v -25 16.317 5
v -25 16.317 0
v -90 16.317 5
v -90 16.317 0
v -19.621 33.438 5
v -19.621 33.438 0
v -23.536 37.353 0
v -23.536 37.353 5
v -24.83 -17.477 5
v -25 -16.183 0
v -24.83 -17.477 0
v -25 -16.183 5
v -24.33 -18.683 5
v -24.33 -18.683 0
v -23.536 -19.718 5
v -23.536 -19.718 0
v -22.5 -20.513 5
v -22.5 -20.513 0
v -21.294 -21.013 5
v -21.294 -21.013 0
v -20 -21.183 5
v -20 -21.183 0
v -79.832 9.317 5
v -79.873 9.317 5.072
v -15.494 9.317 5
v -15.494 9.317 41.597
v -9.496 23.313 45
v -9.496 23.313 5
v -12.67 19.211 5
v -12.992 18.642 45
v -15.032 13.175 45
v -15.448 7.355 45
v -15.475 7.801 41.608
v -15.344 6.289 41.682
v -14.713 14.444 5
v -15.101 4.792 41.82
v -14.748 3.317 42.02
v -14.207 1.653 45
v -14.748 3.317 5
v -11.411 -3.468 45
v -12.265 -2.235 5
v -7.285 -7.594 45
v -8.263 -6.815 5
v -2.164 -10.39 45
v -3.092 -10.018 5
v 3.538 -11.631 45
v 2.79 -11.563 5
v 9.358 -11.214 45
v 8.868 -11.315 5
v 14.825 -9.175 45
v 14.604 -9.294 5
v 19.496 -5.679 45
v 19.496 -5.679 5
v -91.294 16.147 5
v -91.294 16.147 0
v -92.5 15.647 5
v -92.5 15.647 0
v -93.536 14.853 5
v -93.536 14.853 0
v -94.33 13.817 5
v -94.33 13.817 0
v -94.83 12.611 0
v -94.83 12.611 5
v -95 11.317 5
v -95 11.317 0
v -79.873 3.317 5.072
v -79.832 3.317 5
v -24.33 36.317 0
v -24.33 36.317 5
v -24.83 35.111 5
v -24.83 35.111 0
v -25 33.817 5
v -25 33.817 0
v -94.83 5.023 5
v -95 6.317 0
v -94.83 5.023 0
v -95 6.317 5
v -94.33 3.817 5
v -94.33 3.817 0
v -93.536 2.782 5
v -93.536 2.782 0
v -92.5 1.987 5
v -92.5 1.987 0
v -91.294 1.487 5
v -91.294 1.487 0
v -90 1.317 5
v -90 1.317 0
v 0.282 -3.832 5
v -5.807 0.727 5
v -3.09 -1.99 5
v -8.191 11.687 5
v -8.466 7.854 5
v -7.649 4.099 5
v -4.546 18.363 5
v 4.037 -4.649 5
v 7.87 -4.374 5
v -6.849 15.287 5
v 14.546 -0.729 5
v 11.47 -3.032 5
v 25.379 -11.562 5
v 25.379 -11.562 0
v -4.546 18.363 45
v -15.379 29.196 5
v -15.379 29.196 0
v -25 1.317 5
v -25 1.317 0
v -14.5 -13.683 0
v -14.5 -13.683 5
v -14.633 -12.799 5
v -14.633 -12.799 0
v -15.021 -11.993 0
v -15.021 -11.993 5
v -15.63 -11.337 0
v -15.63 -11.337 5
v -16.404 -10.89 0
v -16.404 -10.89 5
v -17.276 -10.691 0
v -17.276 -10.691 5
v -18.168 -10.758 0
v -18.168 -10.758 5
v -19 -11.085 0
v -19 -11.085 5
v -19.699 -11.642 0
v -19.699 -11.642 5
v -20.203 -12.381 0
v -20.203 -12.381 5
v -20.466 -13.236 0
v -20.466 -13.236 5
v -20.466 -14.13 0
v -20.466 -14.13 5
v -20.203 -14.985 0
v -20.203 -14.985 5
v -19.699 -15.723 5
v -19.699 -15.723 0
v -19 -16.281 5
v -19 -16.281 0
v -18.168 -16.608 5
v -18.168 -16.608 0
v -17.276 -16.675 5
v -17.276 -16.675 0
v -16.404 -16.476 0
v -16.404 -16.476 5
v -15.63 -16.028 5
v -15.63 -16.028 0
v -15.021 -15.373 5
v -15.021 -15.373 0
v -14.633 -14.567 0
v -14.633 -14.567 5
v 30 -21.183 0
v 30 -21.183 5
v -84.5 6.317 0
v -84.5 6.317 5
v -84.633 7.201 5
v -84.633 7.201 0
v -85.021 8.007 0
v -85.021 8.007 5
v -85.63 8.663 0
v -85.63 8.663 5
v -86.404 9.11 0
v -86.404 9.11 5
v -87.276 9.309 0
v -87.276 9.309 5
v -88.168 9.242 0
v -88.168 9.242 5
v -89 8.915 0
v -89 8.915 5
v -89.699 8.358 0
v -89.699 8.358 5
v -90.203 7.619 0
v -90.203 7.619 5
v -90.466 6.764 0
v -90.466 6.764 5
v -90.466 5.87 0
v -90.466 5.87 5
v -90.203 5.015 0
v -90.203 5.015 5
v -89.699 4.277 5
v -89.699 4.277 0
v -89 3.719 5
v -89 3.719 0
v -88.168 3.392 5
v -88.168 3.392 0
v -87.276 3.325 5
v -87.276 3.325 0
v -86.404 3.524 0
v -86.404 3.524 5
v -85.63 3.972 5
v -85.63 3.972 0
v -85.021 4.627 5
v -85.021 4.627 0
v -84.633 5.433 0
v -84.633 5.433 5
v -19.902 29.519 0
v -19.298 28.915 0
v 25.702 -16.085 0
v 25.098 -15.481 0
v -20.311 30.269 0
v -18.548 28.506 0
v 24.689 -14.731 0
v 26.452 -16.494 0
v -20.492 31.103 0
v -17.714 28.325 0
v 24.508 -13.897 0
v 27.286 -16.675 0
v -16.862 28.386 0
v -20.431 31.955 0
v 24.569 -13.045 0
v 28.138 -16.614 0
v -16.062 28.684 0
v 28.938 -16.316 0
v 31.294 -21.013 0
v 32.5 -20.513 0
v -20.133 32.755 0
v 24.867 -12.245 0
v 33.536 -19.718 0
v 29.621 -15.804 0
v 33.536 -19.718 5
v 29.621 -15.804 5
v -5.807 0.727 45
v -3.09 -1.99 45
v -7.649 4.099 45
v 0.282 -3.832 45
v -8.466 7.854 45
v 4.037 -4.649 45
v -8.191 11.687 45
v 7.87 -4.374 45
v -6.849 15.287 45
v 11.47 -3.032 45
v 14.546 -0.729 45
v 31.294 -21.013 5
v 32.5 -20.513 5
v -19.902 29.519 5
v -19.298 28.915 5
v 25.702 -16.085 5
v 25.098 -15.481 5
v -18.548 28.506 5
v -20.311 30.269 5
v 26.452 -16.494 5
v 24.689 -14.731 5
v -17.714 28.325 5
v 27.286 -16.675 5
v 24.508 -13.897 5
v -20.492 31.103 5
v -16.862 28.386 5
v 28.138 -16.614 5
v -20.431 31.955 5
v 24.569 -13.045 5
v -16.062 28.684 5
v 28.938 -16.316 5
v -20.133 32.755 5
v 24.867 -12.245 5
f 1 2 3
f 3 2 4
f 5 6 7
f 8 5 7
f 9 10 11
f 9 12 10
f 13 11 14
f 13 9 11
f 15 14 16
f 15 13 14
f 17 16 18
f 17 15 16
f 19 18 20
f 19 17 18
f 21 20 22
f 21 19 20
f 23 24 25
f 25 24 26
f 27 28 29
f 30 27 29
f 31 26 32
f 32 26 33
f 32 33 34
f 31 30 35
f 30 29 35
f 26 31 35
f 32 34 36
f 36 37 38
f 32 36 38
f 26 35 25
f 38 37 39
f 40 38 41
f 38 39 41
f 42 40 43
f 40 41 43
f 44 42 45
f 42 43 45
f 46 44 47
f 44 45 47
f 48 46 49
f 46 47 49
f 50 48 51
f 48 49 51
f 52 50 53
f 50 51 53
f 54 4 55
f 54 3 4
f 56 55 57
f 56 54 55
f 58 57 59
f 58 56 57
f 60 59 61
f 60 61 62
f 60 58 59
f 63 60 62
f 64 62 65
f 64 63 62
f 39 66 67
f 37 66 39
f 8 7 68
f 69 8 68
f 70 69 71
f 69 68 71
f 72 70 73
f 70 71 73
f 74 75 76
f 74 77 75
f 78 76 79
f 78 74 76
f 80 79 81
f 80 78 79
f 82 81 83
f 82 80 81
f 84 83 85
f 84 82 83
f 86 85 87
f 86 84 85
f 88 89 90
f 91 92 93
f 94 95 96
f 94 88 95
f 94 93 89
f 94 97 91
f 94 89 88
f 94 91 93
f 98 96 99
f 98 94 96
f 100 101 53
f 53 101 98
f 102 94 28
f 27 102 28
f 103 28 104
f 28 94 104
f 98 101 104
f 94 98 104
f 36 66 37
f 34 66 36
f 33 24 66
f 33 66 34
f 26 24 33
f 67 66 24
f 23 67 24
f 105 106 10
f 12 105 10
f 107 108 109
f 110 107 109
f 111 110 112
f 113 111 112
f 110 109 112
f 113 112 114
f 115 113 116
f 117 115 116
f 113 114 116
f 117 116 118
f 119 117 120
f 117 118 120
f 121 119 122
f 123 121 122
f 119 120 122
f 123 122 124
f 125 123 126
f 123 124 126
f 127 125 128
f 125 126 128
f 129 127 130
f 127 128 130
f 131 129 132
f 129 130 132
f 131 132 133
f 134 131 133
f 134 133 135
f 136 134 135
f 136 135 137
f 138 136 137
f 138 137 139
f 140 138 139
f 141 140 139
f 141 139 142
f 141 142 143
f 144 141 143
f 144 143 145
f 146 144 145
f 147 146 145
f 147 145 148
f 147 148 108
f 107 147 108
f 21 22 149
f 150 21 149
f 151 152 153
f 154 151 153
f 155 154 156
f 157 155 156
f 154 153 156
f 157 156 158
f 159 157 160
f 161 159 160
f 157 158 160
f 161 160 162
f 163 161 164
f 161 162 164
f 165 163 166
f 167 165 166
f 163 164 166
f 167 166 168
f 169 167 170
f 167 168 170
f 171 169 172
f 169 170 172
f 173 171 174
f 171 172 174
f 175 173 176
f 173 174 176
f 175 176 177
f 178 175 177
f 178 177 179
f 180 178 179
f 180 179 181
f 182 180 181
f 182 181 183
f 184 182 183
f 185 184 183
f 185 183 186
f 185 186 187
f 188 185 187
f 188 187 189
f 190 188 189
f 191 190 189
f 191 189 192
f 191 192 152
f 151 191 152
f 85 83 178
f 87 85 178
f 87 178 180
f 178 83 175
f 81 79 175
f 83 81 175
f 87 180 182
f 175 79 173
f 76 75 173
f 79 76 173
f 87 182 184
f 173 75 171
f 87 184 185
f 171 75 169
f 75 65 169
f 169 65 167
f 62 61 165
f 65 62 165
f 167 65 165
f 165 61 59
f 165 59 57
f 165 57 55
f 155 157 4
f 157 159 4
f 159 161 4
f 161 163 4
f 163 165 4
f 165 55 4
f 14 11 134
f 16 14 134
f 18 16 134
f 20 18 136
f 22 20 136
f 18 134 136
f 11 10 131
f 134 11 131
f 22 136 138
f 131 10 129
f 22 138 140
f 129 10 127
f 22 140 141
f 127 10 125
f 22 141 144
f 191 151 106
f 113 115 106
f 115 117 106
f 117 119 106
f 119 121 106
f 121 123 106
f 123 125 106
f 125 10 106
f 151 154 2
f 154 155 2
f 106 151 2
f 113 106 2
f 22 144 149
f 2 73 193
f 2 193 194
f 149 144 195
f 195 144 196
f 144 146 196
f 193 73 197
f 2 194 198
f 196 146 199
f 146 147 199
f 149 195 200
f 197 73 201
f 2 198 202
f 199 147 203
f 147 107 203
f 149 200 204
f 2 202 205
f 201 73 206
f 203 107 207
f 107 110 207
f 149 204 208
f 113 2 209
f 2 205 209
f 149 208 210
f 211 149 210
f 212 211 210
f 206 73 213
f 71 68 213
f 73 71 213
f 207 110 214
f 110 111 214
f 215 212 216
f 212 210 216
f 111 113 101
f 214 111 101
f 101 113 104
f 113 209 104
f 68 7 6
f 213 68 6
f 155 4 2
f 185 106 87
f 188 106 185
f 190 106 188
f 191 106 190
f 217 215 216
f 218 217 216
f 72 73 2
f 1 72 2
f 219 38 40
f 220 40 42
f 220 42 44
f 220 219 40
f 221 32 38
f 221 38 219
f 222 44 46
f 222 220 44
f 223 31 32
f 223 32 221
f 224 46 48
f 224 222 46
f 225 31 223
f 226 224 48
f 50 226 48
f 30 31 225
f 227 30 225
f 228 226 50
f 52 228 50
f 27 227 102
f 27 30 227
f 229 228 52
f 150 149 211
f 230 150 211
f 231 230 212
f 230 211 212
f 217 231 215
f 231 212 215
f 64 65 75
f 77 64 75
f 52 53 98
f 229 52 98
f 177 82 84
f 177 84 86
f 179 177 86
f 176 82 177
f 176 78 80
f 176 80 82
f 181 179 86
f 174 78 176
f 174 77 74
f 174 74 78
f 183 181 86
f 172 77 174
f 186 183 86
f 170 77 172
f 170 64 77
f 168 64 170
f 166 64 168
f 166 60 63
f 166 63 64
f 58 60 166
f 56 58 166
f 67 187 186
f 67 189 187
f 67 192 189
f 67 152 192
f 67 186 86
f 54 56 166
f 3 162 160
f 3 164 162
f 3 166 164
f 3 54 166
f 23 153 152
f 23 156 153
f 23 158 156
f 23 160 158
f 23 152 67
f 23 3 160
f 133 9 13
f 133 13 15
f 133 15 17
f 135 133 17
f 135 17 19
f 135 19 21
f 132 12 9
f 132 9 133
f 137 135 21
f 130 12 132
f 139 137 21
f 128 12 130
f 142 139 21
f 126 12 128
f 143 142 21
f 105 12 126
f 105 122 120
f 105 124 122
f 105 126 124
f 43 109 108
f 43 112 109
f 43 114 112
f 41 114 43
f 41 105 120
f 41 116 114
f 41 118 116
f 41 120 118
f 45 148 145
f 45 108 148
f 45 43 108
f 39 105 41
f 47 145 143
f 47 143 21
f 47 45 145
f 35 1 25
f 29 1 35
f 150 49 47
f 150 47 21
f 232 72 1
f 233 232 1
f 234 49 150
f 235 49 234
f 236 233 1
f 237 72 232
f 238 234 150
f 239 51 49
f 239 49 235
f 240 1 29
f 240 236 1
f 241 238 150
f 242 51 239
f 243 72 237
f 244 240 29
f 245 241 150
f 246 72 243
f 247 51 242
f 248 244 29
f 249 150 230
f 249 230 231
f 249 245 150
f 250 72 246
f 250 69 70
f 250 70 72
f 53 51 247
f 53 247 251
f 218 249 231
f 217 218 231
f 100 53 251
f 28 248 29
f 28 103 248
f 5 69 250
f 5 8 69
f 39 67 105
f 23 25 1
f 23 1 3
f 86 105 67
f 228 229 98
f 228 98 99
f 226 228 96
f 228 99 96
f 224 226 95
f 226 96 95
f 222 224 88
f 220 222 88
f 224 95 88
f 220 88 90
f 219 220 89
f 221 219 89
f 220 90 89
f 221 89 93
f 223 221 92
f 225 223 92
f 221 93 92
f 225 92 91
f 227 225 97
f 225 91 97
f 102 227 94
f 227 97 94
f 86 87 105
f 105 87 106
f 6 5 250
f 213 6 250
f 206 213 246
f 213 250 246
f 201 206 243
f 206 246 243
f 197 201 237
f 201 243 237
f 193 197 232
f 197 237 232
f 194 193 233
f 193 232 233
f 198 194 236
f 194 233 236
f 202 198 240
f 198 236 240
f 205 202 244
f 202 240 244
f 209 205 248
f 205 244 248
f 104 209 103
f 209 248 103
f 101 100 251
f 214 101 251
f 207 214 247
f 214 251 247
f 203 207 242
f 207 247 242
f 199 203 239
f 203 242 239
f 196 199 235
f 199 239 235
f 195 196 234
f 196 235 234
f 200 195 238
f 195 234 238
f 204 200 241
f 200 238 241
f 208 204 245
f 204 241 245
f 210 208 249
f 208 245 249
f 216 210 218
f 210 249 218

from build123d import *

# Parameters (mm, degrees)
SALIENTE_EXTRUIR1_DEPTH = 5
SALIENTE_EXTRUIR2_DEPTH = 40
EXTRUIR_L_MINA2_REACH   = 62.374
CROQUIS5_W              = 75.430750805
CROQUIS5_H              = 6
REDONDEO1_R             = 5
CROQUIS6_R              = 3
CORTAR_EXTRUIR1_DEPTH   = 40


with BuildPart() as part:
    # Croquis1 → Saliente-Extruir1 (new body)
    with BuildSketch(Plane.XY):
        with BuildLine():
            Line((-25, 16.317101546), (-95, 16.317101546))
            Line((-95, 16.317101546), (-95, 1.317101546))
            Line((-95, 1.317101546), (-25, 1.317101546))
            Line((-25, 1.317101546), (-25, -21.182898454))
            Line((-25, -21.182898454), (30, -21.182898454))
            ThreePointArc((30, -21.182898454), (31.913417162, -20.802296117), (33.535533906, -19.71843236))
            Line((33.535533906, -19.71843236), (-23.535533906, 37.352635452))
            ThreePointArc((-23.535533906, 37.352635452), (-24.619397663, 35.730518707), (-25, 33.817101546))
            Line((-25, 33.817101546), (-25, 16.317101546))
        make_face()
    extrude(amount=SALIENTE_EXTRUIR1_DEPTH)

    # Croquis2 → Saliente-Extruir2 (add)
    with BuildSketch(Plane.XY.offset(5)):
        with BuildLine():
            Line((-4.545941546, 18.363043092), (-9.495689014, 23.31279056))
            ThreePointArc((-9.495689014, 23.31279056), (-9.495689014, -5.678587469), (19.495689014, -5.678587469))
            Line((19.495689014, -5.678587469), (14.545941546, -0.72884))
            ThreePointArc((14.545941546, -0.72884), (-4.545941546, -0.72884), (-4.545941546, 18.363043092))
        make_face()
    extrude(amount=SALIENTE_EXTRUIR2_DEPTH)

    # Croquis5 → Extruir-Lámina2 (add, up to next)
    with BuildSketch(Plane(origin=(-21.625922377, 0, 38.118018916), x_dir=(0.869770425, 0, 0.493456592), z_dir=(-0.493456592, 0, 0.869770425)), mode=Mode.PRIVATE) as extruir_l_mina2_sk1:
        with Locations((-29.252830647, 6.317101546)):
            Rectangle(CROQUIS5_W, CROQUIS5_H)
    extruir_l_mina2_tool1 = extrude(extruir_l_mina2_sk1.sketch, amount=-EXTRUIR_L_MINA2_REACH, mode=Mode.PRIVATE) - part.part
    add(extruir_l_mina2_tool1.solids().sort_by_distance((-47.069169, 6.317102, 23.683017))[0])

    # Redondeo1
    redondeo1_edges = [part.edges().sort_by_distance(p)[0] for p in [
        (-95, 1.317101546, 2.5),
        (-95, 16.317101546, 2.5),
        (-25, -21.182898454, 2.5),
    ]]
    fillet(redondeo1_edges, radius=REDONDEO1_R)

    # Croquis6 → Cortar-Extruir1 (cut)
    with BuildSketch(Plane.XY.offset(5)):
        with Locations((-87.5, 6.317101546)):
            Circle(CROQUIS6_R)
        with Locations((-17.5, -13.682898454)):
            Circle(CROQUIS6_R)
        with Locations((-17.5, 31.317101546)):
            Circle(CROQUIS6_R)
        with Locations((27.5, -13.682898454)):
            Circle(CROQUIS6_R)
    extrude(amount=-CORTAR_EXTRUIR1_DEPTH, mode=Mode.SUBTRACT)


solid = part.part
